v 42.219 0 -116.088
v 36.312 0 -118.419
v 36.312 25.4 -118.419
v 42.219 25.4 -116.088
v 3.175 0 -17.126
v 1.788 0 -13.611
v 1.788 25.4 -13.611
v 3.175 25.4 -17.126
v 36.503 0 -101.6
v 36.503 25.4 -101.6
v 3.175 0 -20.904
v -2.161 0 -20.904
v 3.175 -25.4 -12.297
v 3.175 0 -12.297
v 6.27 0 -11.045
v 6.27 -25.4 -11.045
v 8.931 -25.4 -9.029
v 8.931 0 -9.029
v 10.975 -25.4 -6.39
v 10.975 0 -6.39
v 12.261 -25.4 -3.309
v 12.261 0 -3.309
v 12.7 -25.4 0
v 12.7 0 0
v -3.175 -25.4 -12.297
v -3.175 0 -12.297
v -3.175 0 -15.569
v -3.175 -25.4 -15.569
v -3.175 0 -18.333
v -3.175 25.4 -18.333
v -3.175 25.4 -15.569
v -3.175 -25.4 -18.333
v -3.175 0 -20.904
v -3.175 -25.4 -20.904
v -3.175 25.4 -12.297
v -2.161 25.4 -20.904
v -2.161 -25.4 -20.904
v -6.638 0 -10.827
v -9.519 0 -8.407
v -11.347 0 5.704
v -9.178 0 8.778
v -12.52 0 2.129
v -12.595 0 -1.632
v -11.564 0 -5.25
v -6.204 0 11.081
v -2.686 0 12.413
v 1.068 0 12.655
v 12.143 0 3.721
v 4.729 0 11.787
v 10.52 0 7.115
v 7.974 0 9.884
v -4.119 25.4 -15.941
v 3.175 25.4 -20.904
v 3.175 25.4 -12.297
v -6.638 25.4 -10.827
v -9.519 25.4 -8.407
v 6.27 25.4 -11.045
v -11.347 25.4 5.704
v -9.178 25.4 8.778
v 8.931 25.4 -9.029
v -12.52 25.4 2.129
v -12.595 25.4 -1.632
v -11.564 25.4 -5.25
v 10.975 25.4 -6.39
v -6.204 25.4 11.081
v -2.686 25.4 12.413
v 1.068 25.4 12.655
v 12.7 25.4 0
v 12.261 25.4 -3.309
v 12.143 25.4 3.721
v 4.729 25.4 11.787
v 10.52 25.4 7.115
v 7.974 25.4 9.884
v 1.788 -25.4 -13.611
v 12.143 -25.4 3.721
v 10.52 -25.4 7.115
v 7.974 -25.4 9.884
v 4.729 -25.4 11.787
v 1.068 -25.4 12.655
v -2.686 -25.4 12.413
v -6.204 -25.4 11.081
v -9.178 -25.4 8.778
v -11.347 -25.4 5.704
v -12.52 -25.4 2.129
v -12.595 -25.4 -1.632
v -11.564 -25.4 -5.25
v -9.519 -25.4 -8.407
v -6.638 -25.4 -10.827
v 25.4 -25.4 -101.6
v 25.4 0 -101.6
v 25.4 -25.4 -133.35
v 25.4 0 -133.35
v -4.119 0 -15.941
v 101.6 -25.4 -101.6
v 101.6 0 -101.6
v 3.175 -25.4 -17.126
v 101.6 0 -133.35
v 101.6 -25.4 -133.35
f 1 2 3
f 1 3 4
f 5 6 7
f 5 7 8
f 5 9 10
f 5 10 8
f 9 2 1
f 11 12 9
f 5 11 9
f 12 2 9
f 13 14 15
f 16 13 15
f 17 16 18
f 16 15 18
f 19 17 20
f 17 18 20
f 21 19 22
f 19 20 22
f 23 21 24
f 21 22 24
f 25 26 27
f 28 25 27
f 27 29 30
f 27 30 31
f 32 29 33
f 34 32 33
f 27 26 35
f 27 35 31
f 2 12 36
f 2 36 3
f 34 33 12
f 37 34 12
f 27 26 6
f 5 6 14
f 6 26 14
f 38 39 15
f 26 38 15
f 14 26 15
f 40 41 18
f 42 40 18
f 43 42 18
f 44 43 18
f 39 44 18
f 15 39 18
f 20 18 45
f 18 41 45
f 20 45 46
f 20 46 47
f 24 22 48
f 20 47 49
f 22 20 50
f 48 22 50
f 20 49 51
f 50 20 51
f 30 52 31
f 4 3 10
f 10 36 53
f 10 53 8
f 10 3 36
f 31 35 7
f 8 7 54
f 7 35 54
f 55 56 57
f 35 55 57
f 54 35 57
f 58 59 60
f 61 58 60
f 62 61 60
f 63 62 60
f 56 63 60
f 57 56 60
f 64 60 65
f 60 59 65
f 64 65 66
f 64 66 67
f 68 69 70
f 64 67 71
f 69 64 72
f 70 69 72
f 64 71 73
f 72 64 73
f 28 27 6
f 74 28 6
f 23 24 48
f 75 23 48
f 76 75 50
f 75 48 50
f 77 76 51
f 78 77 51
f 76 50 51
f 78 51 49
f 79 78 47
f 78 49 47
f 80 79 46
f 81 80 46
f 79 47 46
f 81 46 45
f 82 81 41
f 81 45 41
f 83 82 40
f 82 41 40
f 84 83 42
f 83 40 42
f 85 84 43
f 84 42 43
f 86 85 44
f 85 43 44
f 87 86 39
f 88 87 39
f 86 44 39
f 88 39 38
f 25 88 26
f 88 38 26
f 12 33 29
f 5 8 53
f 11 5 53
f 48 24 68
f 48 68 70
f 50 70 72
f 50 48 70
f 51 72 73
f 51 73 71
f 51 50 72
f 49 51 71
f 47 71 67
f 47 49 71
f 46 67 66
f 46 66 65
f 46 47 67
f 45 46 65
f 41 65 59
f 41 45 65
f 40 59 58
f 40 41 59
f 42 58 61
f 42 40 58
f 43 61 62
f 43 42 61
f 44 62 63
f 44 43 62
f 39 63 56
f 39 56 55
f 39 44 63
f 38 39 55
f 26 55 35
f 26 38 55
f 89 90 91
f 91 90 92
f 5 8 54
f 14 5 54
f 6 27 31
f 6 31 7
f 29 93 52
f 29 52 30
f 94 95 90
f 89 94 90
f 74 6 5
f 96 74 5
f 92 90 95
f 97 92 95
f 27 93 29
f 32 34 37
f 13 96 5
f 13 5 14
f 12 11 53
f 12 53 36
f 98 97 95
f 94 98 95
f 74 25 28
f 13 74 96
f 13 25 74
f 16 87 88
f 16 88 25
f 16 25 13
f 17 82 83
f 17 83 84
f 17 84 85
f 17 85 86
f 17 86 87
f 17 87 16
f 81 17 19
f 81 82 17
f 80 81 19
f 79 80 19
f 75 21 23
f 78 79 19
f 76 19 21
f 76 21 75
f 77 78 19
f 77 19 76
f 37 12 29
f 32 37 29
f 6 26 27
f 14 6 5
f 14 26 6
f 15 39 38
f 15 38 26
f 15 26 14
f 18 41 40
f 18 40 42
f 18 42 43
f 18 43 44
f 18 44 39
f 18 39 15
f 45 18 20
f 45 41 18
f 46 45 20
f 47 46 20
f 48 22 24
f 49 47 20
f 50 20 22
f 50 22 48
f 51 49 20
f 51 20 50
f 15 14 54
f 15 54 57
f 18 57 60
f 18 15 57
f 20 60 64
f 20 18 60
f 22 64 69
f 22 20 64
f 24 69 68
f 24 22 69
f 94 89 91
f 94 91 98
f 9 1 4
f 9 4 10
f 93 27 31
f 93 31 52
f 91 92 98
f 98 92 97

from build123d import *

# Parameters (mm, degrees)
F1_DEPTH = 25.4
F2_DEPTH = 25.4
F0_W     = 76.2
F0_H     = 6.35
F3_DEPTH = 25.4


# Not quite as in the source:
# - a feature names something its author has since deleted; it is built from what else it names


with BuildPart() as f1:
    # F0 (on Front) → F1 (new body)
    with BuildSketch(Plane.XZ):
        with BuildLine():
            ThreePointArc((3.175, -12.2967221242), (10.040231571, -7.7771299333), (12.7, 0))
            ThreePointArc((12.7, 0), (-7.7771299333, 10.040231571), (-3.175, -12.2967221242))
            Line((-3.175, -12.2967221242), (-3.175, 3.175))
            Line((-3.175, 3.175), (3.175, 3.175))
            Line((3.175, 3.175), (3.175, -12.2967221242))
        make_face()
        with BuildLine():
            Line((-3.175, 3.175), (-3.175, -12.2967221242))
            ThreePointArc((-3.175, -12.2967221242), (0, -12.7), (3.175, -12.2967221242))
            Line((3.175, -12.2967221242), (3.175, 3.175))
            Line((3.175, 3.175), (-3.175, 3.175))
        make_face()
        with BuildLine():
            ThreePointArc((3.175, -12.2967221242), (0, -12.7), (-3.175, -12.2967221242))
            Line((-3.175, -12.2967221242), (-3.175, -15.5686634239))
            Line((-3.175, -15.5686634239), (1.7882290969, -13.6105246429))
            Line((1.7882290969, -13.6105246429), (3.175, -17.1255266252))
            Line((3.175, -17.1255266252), (3.175, -12.2967221242))
        make_face()
    extrude(amount=F1_DEPTH)


with BuildPart() as f1b:
    # F0 (on Front) → F1, piece 2 (new body)
    with BuildSketch(Plane.XZ):
        Polygon((-2.1605365761, -20.9042), (-3.175, -18.3328733748), (-3.175, -20.9042), align=None)
    extrude(amount=F1_DEPTH)


with BuildPart() as f2:
    # F0 (on Front) → F2 (new body)
    with BuildSketch(Plane.XZ):
        with BuildLine():
            ThreePointArc((3.175, -12.2967221242), (10.040231571, -7.7771299333), (12.7, 0))
            ThreePointArc((12.7, 0), (-7.7771299333, 10.040231571), (-3.175, -12.2967221242))
            Line((-3.175, -12.2967221242), (-3.175, 3.175))
            Line((-3.175, 3.175), (3.175, 3.175))
            Line((3.175, 3.175), (3.175, -12.2967221242))
        make_face()
        with BuildLine():
            Line((-3.175, 3.175), (-3.175, -12.2967221242))
            ThreePointArc((-3.175, -12.2967221242), (0, -12.7), (3.175, -12.2967221242))
            Line((3.175, -12.2967221242), (3.175, 3.175))
            Line((3.175, 3.175), (-3.175, 3.175))
        make_face()
        with BuildLine():
            ThreePointArc((3.175, -12.2967221242), (0, -12.7), (-3.175, -12.2967221242))
            Line((-3.175, -12.2967221242), (-3.175, -15.5686634239))
            Line((-3.175, -15.5686634239), (1.7882290969, -13.6105246429))
            Line((1.7882290969, -13.6105246429), (3.175, -17.1255266252))
            Line((3.175, -17.1255266252), (3.175, -12.2967221242))
        make_face()
    extrude(amount=-F2_DEPTH)


with BuildPart() as f2b:
    # F0 (on Front) → F2, piece 2 (new body)
    with BuildSketch(Plane.XZ):
        Polygon((-3.175, -18.3328733748), (-3.175, -15.5686634239), (-4.1186753571, -15.9409709031), align=None)
    extrude(amount=-F2_DEPTH)


with BuildPart() as f2c:
    # F0 (on Front) → F2, piece 3 (new body)
    with BuildSketch(Plane.XZ):
        Polygon((36.5026459921, -101.6), (3.175, -17.1255266252), (3.175, -20.9042), (-2.1605365761, -20.9042), (29.6763124508, -101.6), align=None)
        Polygon((42.2186753571, -116.0882290969), (36.5026459921, -101.6), (29.6763124508, -101.6), (36.3117709031, -118.4186753571), align=None)
    extrude(amount=-F2_DEPTH)


with BuildPart() as f3:
    # F0 (on Front) → F3 (new body)
    with BuildSketch(Plane.XZ):
        Polygon((101.6, -101.6), (36.5026459921, -101.6), (42.2186753571, -116.0882290969), (36.3117709031, -118.4186753571), (29.6763124508, -101.6), (25.4, -101.6), (25.4, -127), (101.6, -127), align=None)
        Polygon((42.2186753571, -116.0882290969), (36.5026459921, -101.6), (29.6763124508, -101.6), (36.3117709031, -118.4186753571), align=None)
        with Locations((63.5, -130.175)):
            Rectangle(F0_W, F0_H)
    extrude(amount=F3_DEPTH)


solid = Compound([f1.part, f1b.part, f2.part, f2b.part, f2c.part, f3.part])
